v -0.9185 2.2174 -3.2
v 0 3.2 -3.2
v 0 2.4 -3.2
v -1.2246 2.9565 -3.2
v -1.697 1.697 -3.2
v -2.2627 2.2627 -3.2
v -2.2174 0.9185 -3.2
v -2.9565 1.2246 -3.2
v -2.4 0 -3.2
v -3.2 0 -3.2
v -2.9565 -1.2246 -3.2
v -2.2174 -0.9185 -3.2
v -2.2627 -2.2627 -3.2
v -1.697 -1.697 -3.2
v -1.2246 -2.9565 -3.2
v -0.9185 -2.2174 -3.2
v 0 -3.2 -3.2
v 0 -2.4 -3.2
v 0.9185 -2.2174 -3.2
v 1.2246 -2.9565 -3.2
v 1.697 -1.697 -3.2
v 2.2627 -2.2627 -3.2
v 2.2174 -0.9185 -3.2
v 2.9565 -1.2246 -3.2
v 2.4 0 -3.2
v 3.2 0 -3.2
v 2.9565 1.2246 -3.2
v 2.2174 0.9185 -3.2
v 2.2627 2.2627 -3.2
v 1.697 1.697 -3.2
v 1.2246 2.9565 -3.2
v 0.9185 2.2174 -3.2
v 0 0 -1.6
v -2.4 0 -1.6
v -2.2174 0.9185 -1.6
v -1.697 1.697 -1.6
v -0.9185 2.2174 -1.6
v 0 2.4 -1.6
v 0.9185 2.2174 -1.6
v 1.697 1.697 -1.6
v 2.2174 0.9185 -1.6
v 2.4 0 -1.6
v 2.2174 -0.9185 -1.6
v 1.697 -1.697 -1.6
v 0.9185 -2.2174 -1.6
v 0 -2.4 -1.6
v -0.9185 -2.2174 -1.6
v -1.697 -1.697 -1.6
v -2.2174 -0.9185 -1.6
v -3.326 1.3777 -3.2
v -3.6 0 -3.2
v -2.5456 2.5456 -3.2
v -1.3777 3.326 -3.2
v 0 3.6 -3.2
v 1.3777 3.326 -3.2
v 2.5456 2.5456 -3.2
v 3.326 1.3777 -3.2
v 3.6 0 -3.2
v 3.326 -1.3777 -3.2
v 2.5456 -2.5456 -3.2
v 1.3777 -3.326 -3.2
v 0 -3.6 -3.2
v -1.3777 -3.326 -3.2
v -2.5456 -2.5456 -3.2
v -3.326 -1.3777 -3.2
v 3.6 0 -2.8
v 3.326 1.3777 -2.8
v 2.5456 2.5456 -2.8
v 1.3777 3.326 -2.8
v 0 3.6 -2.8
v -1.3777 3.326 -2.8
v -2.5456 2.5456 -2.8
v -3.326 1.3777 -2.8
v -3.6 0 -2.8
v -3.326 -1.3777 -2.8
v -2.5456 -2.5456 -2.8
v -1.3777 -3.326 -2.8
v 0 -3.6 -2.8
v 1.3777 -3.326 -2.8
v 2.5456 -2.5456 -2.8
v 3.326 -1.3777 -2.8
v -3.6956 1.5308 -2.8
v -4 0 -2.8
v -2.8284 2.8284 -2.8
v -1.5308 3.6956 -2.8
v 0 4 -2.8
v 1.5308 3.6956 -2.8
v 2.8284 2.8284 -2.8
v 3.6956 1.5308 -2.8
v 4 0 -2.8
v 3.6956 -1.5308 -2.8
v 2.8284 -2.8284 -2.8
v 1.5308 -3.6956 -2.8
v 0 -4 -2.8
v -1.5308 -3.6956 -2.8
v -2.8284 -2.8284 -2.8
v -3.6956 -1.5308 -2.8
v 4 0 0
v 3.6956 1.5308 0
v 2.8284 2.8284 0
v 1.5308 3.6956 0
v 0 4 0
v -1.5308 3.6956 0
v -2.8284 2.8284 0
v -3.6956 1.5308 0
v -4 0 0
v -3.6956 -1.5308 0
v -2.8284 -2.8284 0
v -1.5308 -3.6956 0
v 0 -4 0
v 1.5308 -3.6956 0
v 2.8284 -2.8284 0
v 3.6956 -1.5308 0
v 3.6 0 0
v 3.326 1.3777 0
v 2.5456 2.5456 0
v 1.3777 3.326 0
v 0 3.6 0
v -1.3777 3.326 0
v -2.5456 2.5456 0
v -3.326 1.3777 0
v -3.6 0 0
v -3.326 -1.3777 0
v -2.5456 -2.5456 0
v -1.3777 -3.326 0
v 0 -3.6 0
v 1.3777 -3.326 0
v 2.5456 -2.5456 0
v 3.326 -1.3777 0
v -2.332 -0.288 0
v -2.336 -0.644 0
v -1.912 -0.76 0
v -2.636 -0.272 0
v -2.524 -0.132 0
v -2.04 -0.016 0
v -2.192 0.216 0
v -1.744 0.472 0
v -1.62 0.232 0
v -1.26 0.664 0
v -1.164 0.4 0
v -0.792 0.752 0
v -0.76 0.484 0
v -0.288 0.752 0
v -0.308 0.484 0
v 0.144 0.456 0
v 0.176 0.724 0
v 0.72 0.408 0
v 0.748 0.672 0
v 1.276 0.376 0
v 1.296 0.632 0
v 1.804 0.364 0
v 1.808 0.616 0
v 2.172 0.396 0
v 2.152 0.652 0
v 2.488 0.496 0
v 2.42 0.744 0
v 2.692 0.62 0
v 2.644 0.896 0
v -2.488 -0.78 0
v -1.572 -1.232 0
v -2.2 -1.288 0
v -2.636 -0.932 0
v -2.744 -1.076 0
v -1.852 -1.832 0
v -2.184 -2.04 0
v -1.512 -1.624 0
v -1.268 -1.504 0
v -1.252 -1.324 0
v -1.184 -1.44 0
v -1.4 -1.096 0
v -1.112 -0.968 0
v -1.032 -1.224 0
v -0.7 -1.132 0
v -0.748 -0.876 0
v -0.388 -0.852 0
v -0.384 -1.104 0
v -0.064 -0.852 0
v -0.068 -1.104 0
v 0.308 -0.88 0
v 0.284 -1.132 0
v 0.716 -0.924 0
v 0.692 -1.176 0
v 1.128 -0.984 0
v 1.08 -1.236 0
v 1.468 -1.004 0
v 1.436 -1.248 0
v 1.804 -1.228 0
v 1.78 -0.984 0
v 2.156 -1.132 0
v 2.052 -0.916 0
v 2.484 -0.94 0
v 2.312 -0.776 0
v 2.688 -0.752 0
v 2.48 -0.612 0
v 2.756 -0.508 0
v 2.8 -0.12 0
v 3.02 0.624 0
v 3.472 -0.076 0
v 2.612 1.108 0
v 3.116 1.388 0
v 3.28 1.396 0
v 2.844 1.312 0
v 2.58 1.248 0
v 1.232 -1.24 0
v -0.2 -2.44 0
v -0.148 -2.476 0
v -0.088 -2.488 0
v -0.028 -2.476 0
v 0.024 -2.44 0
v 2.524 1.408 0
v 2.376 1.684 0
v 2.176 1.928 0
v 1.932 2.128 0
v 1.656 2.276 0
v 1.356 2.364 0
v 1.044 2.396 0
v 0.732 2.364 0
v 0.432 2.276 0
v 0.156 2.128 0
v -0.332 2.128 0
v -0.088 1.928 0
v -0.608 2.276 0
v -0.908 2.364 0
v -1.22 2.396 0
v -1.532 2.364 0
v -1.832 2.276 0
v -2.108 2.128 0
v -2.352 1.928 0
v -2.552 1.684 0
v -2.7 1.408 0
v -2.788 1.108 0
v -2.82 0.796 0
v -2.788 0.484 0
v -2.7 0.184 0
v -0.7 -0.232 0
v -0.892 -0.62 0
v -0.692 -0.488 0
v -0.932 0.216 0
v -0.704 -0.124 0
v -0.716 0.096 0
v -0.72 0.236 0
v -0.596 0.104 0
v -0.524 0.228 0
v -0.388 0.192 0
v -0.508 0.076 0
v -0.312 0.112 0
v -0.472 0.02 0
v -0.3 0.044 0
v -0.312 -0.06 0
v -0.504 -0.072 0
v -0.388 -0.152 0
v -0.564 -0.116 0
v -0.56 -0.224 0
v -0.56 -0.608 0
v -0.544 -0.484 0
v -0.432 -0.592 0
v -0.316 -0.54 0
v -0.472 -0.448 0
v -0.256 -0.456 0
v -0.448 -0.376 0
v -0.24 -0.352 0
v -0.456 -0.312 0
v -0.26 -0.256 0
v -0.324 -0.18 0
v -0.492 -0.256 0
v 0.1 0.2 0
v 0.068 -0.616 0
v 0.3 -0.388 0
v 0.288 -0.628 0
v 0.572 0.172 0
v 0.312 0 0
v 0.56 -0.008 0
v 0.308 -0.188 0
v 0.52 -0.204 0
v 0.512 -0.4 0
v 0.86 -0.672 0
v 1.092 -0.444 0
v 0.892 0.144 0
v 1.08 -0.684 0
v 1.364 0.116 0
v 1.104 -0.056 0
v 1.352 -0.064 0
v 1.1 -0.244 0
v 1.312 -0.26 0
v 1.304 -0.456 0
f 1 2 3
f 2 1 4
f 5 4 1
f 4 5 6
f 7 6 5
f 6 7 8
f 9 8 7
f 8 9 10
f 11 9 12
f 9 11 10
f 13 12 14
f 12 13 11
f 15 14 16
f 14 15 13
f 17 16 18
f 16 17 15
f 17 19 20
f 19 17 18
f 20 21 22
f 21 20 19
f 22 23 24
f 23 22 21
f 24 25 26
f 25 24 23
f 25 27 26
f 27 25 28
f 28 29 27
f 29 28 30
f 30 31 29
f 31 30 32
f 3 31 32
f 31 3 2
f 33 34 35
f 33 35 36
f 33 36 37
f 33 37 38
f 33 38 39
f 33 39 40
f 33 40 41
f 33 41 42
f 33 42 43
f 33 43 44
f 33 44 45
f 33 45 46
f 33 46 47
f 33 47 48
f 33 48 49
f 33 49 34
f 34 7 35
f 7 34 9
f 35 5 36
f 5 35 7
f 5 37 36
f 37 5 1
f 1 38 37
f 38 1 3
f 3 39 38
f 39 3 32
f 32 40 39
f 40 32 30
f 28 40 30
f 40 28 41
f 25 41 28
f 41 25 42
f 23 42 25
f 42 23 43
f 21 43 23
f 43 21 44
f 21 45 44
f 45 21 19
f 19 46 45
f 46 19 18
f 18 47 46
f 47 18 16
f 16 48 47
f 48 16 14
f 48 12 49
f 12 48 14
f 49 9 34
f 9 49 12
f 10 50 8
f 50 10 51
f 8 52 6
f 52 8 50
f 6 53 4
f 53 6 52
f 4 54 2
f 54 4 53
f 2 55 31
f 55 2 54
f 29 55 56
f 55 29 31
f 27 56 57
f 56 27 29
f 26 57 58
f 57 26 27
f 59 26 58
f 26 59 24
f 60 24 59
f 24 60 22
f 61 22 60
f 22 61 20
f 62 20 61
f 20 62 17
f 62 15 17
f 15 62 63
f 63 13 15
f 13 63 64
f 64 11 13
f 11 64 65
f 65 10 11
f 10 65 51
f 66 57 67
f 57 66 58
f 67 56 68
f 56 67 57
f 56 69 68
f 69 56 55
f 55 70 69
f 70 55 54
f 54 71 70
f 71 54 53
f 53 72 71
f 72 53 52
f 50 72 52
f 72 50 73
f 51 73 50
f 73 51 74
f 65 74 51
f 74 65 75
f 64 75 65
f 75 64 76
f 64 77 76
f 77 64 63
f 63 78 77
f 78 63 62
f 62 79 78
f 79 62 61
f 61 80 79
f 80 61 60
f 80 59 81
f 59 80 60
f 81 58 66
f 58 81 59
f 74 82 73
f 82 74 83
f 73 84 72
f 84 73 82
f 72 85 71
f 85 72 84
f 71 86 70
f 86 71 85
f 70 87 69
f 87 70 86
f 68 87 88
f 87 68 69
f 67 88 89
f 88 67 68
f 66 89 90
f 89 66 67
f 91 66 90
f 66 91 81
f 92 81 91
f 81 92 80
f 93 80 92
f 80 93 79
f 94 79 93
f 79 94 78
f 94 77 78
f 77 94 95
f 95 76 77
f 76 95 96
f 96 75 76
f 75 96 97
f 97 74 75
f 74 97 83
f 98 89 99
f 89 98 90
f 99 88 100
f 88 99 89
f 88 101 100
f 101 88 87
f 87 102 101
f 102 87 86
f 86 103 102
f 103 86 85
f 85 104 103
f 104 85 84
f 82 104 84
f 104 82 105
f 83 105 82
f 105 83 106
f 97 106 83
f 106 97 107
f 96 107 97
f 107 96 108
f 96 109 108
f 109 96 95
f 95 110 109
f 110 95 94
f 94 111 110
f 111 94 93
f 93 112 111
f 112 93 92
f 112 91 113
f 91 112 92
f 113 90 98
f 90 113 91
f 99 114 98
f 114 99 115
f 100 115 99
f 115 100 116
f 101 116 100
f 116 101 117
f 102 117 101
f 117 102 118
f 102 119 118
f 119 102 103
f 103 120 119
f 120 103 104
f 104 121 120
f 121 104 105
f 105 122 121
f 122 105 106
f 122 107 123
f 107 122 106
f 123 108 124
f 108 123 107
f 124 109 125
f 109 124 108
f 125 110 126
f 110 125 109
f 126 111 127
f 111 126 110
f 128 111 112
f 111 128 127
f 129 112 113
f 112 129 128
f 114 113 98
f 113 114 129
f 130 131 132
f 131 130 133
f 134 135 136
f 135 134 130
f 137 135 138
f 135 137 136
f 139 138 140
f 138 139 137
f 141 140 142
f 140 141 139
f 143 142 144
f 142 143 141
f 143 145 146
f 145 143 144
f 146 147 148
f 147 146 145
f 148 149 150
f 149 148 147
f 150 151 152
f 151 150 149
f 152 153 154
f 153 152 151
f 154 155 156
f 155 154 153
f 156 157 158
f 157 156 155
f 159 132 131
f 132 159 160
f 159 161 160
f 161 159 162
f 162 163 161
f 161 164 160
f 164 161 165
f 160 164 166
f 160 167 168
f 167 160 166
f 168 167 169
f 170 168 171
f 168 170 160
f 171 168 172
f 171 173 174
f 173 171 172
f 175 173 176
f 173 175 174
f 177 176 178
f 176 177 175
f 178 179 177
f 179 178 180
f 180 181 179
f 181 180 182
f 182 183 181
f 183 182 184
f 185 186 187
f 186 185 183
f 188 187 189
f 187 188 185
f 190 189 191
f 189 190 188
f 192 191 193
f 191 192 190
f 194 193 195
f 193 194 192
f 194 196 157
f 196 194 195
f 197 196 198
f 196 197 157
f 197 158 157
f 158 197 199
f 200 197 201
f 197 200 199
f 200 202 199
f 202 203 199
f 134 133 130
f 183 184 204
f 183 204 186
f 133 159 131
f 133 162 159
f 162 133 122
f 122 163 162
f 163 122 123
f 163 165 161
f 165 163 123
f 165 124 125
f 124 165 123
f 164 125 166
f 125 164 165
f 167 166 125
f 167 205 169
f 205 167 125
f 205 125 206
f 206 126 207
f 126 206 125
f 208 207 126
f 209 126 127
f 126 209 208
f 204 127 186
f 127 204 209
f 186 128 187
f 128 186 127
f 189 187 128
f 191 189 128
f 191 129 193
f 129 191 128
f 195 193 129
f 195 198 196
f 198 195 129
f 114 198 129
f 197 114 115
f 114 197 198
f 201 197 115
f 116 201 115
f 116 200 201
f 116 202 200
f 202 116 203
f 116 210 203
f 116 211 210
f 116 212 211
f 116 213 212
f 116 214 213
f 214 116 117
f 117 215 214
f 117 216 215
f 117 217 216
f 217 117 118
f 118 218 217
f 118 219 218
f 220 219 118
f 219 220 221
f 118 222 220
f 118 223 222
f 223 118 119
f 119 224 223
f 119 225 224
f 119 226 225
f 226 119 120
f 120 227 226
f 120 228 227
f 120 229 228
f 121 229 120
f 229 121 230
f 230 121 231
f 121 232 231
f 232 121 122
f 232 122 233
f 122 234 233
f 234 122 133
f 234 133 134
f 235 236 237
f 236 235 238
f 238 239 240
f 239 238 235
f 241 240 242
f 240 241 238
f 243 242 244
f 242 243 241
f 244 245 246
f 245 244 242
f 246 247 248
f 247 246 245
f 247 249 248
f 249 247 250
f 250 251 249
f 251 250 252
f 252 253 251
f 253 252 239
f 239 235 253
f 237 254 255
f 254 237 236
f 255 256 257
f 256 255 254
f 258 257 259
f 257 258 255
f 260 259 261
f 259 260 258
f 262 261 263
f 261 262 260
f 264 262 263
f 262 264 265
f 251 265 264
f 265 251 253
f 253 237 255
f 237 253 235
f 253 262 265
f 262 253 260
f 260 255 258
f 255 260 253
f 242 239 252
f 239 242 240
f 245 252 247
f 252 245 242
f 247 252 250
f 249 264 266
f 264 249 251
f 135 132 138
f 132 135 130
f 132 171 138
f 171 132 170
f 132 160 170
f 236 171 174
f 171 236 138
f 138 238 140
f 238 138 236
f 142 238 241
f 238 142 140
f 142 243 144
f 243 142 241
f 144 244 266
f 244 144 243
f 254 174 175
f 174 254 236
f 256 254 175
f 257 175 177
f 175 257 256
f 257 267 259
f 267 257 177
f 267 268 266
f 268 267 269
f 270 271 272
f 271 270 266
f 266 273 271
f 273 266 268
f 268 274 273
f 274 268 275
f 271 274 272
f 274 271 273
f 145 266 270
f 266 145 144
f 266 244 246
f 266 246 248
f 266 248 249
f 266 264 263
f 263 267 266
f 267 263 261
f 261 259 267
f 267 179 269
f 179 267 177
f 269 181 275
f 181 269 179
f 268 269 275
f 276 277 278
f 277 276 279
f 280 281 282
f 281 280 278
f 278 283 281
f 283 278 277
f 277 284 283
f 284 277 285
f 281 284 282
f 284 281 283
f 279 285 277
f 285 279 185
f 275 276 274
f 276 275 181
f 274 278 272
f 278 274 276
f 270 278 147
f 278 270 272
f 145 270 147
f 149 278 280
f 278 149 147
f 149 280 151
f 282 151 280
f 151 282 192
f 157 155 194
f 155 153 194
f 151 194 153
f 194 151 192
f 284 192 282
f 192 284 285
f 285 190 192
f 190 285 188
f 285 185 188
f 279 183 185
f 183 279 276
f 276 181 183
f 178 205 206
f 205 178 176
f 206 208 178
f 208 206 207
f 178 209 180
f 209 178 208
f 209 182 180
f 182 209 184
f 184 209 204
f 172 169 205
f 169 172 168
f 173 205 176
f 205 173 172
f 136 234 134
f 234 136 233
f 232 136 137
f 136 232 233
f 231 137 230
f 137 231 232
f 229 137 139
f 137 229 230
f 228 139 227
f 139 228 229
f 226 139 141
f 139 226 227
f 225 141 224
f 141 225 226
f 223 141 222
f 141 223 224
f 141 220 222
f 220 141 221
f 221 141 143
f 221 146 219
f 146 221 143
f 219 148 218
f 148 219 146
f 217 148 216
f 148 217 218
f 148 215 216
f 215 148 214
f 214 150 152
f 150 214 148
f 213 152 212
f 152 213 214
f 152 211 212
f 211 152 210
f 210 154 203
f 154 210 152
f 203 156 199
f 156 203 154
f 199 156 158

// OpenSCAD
use <../lib.scad>
use <s/98138p1ds01.scad>
use <s/98138p1ds02.scad>
function ldraw_lib__98138p2b() = [
// 0 Tile  1 x  1 Round with Dark Azure Heart and Medium Lilac Banner with "BFF" Pattern
// 0 Name: 98138p2b.dat
// 0 Author: Takeshi Takahashi [RainbowDolphin]
// 0 !LDRAW_ORG Part UPDATE 2022-03
// 0 !LICENSE Licensed under CC BY 4.0 : see CAreadme.txt
// 
// 0 BFC CERTIFY CCW
  [0,"BFC","CERTIFY"],
  [0,"BFC","CCW"],
// 
// 0 !KEYWORDS Best Friends Forever, Bricklink 98138pb167, Dots, Mega Pack
// 0 !KEYWORDS Rebrickable 98138pr0166, Set 41913
// 
// 0 !HISTORY 2021-06-14 [RainbowDolphin] Branched from 98138p1d-98138p1g by Gerald Lasser [GeraldLasser] for different colour
// 0 !HISTORY 2022-05-07 [PTadmin] Official Update 2022-03
// 
// 
// 1 16 0 0 0 1 0 0 0 1 0 0 0 1 s\98138p1ds01.dat
  [1,16,0,0,0,1,0,0,0,1,0,0,0,1, ldraw_lib__s__98138p1ds01()],
// 1 321 0 0 0 1 0 0 0 1 0 0 0 1 s\98138p1ds02.dat
  [1,321,0,0,0,1,0,0,0,1,0,0,0,1, ldraw_lib__s__98138p1ds02()],
];
module ldraw_lib__98138p2b(step=0, col=false, unit=2/5, alt=false, line=0.2, solid=!$preview)
    makepoly(ldraw_lib__98138p2b(), step=step, col=col, unit=unit, alt=alt, line=line, solid=solid);
ldraw_lib__98138p2b(line=0.2);
